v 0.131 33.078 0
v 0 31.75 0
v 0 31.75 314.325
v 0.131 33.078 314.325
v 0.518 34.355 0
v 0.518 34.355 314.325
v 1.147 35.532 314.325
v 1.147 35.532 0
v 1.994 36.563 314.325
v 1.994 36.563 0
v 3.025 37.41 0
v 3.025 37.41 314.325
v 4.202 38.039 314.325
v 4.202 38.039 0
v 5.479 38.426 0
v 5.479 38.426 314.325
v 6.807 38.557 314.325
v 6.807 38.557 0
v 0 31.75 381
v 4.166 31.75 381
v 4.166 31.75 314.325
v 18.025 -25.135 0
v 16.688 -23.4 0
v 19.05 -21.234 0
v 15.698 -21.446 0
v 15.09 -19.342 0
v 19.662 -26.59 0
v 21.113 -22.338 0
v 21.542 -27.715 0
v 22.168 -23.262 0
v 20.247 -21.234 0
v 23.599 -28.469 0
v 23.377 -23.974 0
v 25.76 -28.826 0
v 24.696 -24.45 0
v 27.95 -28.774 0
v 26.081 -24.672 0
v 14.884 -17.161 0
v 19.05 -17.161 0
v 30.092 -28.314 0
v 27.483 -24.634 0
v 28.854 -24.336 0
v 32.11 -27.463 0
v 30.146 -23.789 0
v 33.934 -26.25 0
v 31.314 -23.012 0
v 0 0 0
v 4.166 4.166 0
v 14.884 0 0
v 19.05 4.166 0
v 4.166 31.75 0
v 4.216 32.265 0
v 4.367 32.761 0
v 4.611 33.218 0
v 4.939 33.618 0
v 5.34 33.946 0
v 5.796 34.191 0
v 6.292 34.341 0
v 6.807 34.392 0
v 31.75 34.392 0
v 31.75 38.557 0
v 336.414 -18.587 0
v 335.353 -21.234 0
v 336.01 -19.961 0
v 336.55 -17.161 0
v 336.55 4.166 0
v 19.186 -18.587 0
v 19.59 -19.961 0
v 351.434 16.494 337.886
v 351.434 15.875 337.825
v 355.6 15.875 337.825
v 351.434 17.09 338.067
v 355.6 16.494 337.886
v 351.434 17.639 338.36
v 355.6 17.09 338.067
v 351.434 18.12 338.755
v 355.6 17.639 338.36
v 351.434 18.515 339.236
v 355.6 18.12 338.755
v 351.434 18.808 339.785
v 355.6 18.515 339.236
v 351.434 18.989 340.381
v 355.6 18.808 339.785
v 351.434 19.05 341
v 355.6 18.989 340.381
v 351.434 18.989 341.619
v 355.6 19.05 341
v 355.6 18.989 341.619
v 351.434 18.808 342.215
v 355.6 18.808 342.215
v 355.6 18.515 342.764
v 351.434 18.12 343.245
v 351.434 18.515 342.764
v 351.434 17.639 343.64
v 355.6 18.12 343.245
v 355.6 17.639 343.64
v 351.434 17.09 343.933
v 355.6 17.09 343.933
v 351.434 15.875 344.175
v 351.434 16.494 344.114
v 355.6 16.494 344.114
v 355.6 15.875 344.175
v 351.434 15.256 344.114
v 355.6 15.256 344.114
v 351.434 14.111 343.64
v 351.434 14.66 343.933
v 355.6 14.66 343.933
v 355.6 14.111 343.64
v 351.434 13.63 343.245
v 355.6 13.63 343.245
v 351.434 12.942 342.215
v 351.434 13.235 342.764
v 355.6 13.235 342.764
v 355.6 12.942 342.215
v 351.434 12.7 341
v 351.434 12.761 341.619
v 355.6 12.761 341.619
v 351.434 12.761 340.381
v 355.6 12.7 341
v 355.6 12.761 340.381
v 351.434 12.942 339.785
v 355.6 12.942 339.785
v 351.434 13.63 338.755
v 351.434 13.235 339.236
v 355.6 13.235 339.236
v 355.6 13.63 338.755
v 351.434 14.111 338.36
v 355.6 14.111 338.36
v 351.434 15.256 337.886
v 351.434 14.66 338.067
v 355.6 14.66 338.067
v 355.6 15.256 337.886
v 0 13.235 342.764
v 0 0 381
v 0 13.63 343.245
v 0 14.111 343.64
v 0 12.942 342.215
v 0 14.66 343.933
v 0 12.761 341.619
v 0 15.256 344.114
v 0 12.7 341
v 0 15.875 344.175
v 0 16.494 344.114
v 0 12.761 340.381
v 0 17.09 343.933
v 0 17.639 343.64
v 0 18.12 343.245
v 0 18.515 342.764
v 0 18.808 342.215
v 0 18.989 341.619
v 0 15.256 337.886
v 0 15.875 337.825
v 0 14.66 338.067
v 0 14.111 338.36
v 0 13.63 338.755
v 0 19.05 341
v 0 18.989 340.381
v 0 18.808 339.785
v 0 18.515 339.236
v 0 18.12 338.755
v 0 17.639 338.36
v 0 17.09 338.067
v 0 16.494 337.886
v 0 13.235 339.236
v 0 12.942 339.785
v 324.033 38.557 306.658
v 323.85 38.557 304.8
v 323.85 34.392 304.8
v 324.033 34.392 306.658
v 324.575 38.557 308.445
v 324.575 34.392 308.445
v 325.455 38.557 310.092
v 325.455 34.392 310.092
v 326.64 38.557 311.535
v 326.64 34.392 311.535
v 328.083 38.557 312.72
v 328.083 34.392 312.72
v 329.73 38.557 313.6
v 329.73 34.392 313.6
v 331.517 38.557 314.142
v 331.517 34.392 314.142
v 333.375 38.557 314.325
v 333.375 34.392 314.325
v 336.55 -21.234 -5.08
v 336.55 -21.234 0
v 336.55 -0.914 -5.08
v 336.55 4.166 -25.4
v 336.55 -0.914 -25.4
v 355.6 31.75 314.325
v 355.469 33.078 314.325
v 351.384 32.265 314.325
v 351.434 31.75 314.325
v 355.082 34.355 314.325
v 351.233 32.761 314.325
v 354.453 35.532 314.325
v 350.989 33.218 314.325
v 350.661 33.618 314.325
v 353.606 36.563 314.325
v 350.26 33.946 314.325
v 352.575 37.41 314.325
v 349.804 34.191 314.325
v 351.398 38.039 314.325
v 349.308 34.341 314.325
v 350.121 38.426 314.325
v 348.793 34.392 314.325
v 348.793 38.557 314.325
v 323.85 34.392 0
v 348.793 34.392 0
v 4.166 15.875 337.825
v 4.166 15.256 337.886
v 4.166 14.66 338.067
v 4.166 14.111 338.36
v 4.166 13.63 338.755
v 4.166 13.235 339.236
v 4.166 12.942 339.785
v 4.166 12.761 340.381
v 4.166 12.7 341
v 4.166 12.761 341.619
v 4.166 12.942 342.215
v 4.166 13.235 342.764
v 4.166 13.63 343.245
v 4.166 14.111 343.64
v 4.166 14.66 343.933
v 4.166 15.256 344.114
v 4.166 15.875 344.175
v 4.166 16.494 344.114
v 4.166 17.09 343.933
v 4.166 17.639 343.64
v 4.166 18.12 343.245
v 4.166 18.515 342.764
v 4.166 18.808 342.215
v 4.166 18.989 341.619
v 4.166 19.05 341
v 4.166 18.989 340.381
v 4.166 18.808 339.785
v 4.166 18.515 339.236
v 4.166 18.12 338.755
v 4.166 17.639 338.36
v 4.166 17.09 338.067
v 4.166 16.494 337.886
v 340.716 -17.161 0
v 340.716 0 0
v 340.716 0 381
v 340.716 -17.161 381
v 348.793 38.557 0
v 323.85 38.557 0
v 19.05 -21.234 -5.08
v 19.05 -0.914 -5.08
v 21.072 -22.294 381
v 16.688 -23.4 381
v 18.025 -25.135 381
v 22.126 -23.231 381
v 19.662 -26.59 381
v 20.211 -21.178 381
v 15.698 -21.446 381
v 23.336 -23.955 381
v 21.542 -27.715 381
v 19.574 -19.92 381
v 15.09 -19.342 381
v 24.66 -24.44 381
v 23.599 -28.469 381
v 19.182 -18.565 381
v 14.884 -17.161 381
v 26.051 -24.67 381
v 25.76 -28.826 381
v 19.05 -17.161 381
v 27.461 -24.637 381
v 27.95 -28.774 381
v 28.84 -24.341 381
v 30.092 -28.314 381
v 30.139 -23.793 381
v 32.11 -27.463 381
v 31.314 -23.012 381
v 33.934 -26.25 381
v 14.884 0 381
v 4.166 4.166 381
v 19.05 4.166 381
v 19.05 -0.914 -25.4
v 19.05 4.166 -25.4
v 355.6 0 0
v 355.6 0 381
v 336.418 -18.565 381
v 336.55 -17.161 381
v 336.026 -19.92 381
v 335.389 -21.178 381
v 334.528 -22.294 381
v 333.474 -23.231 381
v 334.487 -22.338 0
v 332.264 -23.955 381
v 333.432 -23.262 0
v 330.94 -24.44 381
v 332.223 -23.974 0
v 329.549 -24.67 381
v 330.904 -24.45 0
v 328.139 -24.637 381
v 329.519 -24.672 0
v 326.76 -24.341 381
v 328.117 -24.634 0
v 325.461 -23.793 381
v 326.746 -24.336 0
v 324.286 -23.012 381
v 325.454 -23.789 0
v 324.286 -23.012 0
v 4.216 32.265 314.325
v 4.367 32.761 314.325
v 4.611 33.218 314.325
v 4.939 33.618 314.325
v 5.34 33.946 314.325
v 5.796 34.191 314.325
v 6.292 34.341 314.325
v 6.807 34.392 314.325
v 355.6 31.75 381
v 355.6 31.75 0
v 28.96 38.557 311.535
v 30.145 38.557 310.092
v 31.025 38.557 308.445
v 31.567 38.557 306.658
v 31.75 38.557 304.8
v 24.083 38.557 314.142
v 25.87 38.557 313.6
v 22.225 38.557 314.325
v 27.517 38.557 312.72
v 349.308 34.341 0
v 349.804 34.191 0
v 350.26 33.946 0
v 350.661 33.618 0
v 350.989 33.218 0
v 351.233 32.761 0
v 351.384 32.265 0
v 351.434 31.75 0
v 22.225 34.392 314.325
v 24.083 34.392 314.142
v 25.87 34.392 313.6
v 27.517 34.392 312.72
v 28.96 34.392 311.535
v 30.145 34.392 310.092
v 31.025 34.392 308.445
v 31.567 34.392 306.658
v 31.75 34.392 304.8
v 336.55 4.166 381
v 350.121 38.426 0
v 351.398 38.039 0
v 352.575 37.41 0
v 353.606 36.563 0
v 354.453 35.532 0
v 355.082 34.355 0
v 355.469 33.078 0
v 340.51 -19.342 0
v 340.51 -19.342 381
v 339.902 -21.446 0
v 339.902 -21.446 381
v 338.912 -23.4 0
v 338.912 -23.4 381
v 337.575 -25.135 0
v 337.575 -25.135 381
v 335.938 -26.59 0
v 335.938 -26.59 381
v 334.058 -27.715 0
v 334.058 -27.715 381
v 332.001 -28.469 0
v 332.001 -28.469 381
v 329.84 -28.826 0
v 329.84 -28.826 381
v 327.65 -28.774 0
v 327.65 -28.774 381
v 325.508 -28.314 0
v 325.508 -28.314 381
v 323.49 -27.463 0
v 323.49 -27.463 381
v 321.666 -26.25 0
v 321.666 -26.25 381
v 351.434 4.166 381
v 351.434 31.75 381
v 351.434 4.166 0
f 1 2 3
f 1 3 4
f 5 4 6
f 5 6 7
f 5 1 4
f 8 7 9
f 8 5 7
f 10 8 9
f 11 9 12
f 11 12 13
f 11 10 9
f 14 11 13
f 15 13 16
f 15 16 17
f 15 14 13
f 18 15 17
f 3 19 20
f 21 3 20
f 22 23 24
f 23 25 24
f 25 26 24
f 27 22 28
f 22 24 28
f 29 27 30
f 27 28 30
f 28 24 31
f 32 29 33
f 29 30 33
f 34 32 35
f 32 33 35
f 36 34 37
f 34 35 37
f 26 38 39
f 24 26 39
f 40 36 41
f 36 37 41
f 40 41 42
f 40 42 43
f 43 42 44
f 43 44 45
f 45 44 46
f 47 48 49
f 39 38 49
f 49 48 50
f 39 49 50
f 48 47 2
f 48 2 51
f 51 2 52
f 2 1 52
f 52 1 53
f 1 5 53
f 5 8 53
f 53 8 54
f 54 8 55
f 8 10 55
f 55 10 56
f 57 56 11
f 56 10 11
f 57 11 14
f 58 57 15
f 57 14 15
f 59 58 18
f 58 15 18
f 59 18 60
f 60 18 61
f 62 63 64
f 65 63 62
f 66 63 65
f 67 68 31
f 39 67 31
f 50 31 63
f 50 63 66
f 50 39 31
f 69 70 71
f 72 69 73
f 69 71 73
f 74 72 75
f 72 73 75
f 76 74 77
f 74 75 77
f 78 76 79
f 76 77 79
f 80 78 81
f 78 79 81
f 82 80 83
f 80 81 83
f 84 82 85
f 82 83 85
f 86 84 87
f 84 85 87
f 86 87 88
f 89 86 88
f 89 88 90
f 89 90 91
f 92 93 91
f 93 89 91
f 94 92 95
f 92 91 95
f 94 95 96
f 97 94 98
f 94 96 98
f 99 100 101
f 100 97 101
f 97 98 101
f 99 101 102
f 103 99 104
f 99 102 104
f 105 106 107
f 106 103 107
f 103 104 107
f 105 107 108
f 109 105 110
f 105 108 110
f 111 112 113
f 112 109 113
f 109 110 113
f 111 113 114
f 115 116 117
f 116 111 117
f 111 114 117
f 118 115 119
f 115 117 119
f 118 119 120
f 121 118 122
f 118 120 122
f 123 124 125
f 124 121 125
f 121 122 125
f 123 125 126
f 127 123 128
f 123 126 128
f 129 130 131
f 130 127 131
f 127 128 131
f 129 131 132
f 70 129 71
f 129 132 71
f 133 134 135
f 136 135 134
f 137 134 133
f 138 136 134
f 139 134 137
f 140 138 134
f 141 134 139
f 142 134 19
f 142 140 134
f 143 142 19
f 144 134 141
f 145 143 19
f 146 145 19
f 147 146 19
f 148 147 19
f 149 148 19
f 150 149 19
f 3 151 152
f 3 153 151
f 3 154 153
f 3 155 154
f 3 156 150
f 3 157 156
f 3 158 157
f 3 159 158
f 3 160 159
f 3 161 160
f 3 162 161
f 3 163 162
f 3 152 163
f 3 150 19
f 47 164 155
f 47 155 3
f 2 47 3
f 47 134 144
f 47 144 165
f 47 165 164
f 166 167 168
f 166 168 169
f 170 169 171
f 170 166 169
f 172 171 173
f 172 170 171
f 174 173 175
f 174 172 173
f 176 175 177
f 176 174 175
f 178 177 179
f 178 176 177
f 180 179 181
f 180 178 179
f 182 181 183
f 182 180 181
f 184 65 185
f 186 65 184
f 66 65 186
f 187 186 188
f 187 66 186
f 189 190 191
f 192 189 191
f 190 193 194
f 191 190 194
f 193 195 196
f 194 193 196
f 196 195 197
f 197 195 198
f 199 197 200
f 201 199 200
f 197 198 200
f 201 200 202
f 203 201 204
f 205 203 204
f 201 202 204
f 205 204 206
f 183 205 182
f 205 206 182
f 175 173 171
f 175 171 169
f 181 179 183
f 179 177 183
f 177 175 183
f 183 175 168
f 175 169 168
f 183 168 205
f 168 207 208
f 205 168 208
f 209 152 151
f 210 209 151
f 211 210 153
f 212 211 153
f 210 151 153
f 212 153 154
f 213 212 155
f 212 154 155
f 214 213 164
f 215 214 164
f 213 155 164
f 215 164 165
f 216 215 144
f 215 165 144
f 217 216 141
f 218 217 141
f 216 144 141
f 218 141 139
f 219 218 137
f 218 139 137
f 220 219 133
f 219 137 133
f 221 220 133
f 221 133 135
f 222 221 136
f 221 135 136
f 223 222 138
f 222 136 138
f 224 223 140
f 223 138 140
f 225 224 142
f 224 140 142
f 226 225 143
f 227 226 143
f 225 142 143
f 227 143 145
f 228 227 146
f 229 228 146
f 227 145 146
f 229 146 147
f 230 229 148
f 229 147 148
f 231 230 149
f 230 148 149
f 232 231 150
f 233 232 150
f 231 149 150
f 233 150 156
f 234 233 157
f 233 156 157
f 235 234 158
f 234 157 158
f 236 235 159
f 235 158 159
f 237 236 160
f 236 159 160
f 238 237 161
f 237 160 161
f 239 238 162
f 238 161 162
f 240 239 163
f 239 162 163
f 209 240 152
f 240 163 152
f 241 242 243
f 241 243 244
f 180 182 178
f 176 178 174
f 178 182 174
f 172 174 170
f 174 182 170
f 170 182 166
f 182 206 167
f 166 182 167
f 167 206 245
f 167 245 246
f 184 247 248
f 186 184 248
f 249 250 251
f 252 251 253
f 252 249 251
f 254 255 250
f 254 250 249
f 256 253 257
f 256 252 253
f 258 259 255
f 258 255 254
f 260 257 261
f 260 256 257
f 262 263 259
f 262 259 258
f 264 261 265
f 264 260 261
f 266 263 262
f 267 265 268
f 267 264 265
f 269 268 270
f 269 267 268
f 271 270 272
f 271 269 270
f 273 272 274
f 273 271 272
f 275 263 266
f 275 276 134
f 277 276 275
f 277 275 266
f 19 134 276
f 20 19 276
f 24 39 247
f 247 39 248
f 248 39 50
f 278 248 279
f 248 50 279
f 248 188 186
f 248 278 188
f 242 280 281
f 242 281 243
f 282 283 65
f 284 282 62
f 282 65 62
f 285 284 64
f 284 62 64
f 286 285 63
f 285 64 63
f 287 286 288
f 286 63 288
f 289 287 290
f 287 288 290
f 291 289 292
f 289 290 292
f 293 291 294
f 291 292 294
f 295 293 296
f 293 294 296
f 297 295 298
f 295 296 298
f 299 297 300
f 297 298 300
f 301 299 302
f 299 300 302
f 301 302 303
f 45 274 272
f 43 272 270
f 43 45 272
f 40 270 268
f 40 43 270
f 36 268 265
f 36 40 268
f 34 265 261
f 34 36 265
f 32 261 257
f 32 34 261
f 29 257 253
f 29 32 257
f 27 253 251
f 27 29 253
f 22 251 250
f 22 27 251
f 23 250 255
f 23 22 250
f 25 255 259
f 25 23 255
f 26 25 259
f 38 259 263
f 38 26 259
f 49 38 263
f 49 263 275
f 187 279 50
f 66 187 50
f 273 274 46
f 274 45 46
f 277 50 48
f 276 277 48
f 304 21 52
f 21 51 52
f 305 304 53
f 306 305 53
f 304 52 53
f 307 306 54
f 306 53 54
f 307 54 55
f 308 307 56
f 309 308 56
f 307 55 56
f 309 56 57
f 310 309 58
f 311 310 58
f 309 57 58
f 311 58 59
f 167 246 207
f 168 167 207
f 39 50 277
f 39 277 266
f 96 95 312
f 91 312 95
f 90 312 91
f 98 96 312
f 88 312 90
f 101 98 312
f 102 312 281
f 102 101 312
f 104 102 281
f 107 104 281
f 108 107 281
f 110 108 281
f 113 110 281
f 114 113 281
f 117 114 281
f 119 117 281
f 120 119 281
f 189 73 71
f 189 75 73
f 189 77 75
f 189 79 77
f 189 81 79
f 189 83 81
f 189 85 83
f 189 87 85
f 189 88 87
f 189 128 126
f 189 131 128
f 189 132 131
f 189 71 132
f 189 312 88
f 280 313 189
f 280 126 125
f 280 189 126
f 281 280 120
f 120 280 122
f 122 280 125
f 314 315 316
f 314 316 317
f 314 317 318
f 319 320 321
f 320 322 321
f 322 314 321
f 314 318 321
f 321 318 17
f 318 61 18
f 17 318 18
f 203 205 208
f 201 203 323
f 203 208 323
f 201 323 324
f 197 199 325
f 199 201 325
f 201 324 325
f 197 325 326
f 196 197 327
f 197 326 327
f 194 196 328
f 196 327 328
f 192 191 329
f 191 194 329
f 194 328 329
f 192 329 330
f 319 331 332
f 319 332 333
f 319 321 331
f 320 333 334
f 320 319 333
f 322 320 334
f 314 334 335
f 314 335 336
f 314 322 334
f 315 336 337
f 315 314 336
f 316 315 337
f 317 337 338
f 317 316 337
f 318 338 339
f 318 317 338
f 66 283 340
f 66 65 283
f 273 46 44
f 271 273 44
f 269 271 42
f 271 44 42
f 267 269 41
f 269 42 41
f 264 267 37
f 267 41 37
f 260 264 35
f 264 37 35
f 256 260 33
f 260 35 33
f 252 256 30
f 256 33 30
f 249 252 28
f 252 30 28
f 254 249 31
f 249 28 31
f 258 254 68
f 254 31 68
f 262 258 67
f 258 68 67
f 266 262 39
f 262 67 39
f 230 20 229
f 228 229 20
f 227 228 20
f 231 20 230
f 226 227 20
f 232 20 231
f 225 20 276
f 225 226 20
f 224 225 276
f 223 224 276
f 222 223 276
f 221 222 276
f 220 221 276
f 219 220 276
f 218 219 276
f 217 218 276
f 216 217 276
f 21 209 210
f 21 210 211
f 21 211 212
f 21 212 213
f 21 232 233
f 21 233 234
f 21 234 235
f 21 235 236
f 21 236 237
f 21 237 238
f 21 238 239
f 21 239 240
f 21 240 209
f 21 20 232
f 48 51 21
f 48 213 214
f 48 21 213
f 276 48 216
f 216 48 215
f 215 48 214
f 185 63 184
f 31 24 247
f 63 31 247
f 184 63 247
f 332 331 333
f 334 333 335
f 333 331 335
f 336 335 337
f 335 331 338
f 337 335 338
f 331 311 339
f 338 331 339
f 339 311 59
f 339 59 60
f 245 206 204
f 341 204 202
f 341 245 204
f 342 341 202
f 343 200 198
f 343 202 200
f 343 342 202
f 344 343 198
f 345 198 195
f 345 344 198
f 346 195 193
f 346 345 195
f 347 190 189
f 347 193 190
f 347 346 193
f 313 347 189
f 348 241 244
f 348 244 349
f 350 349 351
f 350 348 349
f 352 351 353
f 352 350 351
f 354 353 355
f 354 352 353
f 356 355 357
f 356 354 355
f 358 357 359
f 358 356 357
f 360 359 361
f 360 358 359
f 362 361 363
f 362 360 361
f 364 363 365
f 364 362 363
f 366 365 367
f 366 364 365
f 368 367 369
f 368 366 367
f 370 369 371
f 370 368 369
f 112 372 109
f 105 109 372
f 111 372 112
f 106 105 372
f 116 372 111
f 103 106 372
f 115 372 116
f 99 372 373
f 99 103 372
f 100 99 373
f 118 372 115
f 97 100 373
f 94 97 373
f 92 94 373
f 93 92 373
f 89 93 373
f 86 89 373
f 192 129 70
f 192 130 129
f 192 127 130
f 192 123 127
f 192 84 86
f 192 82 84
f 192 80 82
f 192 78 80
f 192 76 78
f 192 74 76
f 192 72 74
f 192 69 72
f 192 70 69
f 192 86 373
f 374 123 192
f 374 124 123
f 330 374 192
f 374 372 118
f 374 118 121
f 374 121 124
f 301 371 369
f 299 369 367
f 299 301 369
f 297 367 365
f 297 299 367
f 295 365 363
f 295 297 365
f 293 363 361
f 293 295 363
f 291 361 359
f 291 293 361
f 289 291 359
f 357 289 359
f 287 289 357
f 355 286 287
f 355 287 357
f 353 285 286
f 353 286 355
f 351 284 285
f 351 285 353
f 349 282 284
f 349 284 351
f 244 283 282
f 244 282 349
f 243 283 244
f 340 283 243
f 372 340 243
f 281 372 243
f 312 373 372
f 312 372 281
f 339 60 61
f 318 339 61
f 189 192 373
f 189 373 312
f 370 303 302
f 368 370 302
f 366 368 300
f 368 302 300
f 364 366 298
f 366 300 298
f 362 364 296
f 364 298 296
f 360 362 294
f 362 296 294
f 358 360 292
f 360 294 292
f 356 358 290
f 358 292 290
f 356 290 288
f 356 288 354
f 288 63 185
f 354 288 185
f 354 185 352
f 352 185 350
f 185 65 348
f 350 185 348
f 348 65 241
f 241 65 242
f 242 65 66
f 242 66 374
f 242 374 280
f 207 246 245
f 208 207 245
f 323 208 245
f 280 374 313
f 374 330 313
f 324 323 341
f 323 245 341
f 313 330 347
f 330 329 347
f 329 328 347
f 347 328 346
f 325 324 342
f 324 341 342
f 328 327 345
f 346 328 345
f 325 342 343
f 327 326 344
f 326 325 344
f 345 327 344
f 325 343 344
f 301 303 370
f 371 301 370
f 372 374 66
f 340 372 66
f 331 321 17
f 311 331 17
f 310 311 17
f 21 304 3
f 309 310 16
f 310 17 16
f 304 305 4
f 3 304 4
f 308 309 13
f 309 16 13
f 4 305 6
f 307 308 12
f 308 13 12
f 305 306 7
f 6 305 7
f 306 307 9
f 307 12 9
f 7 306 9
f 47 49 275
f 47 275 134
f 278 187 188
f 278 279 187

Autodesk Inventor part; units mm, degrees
ref_plane "YZ Plane" through (0, 0, 0) normal (1, 0, 0) x (0, 1, 0)
ref_plane "XZ Plane" through (0, 0, 0) normal (0, 1, 0) x (-1, 0, 0)
ref_plane "XY Plane" through (0, 0, 0) normal (0, 0, 1) x (1, 0, 0)
sketch "Sketch1" plane through (0, 0, 0) normal (0, 0, 1) x (1, 0, 0)
  line L0 (0, 31.75) -> (4.1656, 31.75)
  line L1 (4.1656, 31.75) -> (4.1656, 0)
  line L2 (4.1656, 0) -> (0, 0)
  line L3 (0, 0) -> (0, 31.75)
  line L4 (4.1656, 0) -> (14.8844, 0)
  line L5 (14.8844, 0) -> (14.8844, 4.1656)
  line L6 (14.8844, 4.1656) -> (4.1656, 4.1656)
  line L7 (4.1656, 4.1656) -> (4.1656, 0)
  line L8 (14.8844, 4.1656) -> (19.05, 4.1656)
  line L9 (19.05, 4.1656) -> (19.05, -17.161)
  line L10 (19.05, -17.161) -> (14.8844, -17.161)
  line L11 (14.8844, -17.161) -> (14.8844, 4.1656)
  arc A0 (14.8844, -17.161) -> (33.9344, -26.2503) centre (26.5778, -17.161) ccw
  arc A1 (19.05, -17.161) -> (31.3137, -23.0124) centre (26.5778, -17.161) ccw
  line L12 (33.9344, -26.2503) -> (31.3137, -23.0124)
  line L13 (16.255, -28.8544) -> (45.3124, -28.8544)
  dimension "d0" = 31.75
  dimension "d1" = 19.05
  dimension "d2" = 4.1656
  dimension "d5" = 33.02
  dimension "d6" = 19.05
  dimension "d7" = 5.842
extrude "Extrusion1" add sketch "Sketch1" along normal blind 381
sketch "Sketch2" plane through (0, 0, 0) normal (0, 0, -1) x (-1, 0, 0)
  line L0 (0, 31.75) -> (0, 0) projected
  line L1 (-4.1656, 31.75) -> (0, 31.75) projected
  line L2 (-4.1656, 4.1656) -> (-4.1656, 31.75) projected
  arc A0 (-33.9344, -26.2503) -> (-14.8844, -17.161) centre (-26.5778, -17.161) ccw projected
  line L3 (-31.75, 38.5572) -> (-6.8072, 38.5572)
  line L4 (-6.8072, 38.5572) -> (-6.8072, 34.3916)
  line L5 (-6.8072, 34.3916) -> (-31.75, 34.3916)
  line L6 (-31.75, 34.3916) -> (-31.75, 38.5572)
  arc A1 (0, 31.75) -> (-6.8072, 38.5572) centre (-6.8072, 31.75) ccw
  arc A2 (-4.1656, 31.75) -> (-6.8072, 34.3916) centre (-6.8072, 31.75) ccw
  line L7 (-19.05, -28.8544) -> (-58.4387, -28.8544)
  dimension "d12" = 67.4116
  dimension "d13" = 31.75
extrude "Extrusion2" add sketch "Sketch2" against normal blind 314.325
fillet "Fillet1" radius 9.525 1 edges at (31.75, 36.4744, 314.325)
ref_plane "Work Plane1" through (177.8, 0, 381) normal (-1, 0, 0) x (0, 0, 1)
sketch "Sketch4" plane through (4.1656, 4.1656, 381) normal (1, 0, 0) x (0, 0, -1)
  line L0 (66.675, 27.5844) -> (0, 27.5844) projected
  line L1 (0, 27.5844) -> (0, 0) projected
  point P0 (381, -4.1656)
  point P1 (40, 11.7094)
  dimension "d24" = 15.875
  dimension "d25" = 40
hole "Hole1" at (4.1656, 15.875, 341) direction (-1, 0, 0) diameter 6.35 end through all
mirror "Mirror2" about plane through (177.8, 0, 381) normal (-1, 0, 0) of "Extrusion1", "Extrusion2", "Fillet1", "Hole1"
sketch "Sketch3" plane through (19.05, -17.161, 0) normal (1, 0, 0) x (0, 0, -1)
  line L0 (0, 0) -> (0, 21.3266)
  line L1 (0, 21.3266) -> (-381, 21.3266) projected
  line L2 (0, -4.0734) -> (5.08, -4.0734)
  line L3 (5.08, -4.0734) -> (5.08, 21.3266)
  line L4 (5.08, 21.3266) -> (0, 21.3266)
  line L5 (0, 21.3266) -> (0, -4.0734)
  line L6 (5.08, 21.3266) -> (25.4, 21.3266)
  line L7 (25.4, 21.3266) -> (25.4, 16.2466)
  line L8 (25.4, 16.2466) -> (5.08, 16.2466)
  line L9 (5.08, 16.2466) -> (5.08, 21.3266)
  point P0 (0, 17.161)
  dimension "d18" = 5.08
  dimension "d19" = 25.4
  dimension "d20" = 25.4
extrude "crosspiece" add sketch "Sketch3" along normal up to surface (317.5 mm away)
properties part number "battery rails"
